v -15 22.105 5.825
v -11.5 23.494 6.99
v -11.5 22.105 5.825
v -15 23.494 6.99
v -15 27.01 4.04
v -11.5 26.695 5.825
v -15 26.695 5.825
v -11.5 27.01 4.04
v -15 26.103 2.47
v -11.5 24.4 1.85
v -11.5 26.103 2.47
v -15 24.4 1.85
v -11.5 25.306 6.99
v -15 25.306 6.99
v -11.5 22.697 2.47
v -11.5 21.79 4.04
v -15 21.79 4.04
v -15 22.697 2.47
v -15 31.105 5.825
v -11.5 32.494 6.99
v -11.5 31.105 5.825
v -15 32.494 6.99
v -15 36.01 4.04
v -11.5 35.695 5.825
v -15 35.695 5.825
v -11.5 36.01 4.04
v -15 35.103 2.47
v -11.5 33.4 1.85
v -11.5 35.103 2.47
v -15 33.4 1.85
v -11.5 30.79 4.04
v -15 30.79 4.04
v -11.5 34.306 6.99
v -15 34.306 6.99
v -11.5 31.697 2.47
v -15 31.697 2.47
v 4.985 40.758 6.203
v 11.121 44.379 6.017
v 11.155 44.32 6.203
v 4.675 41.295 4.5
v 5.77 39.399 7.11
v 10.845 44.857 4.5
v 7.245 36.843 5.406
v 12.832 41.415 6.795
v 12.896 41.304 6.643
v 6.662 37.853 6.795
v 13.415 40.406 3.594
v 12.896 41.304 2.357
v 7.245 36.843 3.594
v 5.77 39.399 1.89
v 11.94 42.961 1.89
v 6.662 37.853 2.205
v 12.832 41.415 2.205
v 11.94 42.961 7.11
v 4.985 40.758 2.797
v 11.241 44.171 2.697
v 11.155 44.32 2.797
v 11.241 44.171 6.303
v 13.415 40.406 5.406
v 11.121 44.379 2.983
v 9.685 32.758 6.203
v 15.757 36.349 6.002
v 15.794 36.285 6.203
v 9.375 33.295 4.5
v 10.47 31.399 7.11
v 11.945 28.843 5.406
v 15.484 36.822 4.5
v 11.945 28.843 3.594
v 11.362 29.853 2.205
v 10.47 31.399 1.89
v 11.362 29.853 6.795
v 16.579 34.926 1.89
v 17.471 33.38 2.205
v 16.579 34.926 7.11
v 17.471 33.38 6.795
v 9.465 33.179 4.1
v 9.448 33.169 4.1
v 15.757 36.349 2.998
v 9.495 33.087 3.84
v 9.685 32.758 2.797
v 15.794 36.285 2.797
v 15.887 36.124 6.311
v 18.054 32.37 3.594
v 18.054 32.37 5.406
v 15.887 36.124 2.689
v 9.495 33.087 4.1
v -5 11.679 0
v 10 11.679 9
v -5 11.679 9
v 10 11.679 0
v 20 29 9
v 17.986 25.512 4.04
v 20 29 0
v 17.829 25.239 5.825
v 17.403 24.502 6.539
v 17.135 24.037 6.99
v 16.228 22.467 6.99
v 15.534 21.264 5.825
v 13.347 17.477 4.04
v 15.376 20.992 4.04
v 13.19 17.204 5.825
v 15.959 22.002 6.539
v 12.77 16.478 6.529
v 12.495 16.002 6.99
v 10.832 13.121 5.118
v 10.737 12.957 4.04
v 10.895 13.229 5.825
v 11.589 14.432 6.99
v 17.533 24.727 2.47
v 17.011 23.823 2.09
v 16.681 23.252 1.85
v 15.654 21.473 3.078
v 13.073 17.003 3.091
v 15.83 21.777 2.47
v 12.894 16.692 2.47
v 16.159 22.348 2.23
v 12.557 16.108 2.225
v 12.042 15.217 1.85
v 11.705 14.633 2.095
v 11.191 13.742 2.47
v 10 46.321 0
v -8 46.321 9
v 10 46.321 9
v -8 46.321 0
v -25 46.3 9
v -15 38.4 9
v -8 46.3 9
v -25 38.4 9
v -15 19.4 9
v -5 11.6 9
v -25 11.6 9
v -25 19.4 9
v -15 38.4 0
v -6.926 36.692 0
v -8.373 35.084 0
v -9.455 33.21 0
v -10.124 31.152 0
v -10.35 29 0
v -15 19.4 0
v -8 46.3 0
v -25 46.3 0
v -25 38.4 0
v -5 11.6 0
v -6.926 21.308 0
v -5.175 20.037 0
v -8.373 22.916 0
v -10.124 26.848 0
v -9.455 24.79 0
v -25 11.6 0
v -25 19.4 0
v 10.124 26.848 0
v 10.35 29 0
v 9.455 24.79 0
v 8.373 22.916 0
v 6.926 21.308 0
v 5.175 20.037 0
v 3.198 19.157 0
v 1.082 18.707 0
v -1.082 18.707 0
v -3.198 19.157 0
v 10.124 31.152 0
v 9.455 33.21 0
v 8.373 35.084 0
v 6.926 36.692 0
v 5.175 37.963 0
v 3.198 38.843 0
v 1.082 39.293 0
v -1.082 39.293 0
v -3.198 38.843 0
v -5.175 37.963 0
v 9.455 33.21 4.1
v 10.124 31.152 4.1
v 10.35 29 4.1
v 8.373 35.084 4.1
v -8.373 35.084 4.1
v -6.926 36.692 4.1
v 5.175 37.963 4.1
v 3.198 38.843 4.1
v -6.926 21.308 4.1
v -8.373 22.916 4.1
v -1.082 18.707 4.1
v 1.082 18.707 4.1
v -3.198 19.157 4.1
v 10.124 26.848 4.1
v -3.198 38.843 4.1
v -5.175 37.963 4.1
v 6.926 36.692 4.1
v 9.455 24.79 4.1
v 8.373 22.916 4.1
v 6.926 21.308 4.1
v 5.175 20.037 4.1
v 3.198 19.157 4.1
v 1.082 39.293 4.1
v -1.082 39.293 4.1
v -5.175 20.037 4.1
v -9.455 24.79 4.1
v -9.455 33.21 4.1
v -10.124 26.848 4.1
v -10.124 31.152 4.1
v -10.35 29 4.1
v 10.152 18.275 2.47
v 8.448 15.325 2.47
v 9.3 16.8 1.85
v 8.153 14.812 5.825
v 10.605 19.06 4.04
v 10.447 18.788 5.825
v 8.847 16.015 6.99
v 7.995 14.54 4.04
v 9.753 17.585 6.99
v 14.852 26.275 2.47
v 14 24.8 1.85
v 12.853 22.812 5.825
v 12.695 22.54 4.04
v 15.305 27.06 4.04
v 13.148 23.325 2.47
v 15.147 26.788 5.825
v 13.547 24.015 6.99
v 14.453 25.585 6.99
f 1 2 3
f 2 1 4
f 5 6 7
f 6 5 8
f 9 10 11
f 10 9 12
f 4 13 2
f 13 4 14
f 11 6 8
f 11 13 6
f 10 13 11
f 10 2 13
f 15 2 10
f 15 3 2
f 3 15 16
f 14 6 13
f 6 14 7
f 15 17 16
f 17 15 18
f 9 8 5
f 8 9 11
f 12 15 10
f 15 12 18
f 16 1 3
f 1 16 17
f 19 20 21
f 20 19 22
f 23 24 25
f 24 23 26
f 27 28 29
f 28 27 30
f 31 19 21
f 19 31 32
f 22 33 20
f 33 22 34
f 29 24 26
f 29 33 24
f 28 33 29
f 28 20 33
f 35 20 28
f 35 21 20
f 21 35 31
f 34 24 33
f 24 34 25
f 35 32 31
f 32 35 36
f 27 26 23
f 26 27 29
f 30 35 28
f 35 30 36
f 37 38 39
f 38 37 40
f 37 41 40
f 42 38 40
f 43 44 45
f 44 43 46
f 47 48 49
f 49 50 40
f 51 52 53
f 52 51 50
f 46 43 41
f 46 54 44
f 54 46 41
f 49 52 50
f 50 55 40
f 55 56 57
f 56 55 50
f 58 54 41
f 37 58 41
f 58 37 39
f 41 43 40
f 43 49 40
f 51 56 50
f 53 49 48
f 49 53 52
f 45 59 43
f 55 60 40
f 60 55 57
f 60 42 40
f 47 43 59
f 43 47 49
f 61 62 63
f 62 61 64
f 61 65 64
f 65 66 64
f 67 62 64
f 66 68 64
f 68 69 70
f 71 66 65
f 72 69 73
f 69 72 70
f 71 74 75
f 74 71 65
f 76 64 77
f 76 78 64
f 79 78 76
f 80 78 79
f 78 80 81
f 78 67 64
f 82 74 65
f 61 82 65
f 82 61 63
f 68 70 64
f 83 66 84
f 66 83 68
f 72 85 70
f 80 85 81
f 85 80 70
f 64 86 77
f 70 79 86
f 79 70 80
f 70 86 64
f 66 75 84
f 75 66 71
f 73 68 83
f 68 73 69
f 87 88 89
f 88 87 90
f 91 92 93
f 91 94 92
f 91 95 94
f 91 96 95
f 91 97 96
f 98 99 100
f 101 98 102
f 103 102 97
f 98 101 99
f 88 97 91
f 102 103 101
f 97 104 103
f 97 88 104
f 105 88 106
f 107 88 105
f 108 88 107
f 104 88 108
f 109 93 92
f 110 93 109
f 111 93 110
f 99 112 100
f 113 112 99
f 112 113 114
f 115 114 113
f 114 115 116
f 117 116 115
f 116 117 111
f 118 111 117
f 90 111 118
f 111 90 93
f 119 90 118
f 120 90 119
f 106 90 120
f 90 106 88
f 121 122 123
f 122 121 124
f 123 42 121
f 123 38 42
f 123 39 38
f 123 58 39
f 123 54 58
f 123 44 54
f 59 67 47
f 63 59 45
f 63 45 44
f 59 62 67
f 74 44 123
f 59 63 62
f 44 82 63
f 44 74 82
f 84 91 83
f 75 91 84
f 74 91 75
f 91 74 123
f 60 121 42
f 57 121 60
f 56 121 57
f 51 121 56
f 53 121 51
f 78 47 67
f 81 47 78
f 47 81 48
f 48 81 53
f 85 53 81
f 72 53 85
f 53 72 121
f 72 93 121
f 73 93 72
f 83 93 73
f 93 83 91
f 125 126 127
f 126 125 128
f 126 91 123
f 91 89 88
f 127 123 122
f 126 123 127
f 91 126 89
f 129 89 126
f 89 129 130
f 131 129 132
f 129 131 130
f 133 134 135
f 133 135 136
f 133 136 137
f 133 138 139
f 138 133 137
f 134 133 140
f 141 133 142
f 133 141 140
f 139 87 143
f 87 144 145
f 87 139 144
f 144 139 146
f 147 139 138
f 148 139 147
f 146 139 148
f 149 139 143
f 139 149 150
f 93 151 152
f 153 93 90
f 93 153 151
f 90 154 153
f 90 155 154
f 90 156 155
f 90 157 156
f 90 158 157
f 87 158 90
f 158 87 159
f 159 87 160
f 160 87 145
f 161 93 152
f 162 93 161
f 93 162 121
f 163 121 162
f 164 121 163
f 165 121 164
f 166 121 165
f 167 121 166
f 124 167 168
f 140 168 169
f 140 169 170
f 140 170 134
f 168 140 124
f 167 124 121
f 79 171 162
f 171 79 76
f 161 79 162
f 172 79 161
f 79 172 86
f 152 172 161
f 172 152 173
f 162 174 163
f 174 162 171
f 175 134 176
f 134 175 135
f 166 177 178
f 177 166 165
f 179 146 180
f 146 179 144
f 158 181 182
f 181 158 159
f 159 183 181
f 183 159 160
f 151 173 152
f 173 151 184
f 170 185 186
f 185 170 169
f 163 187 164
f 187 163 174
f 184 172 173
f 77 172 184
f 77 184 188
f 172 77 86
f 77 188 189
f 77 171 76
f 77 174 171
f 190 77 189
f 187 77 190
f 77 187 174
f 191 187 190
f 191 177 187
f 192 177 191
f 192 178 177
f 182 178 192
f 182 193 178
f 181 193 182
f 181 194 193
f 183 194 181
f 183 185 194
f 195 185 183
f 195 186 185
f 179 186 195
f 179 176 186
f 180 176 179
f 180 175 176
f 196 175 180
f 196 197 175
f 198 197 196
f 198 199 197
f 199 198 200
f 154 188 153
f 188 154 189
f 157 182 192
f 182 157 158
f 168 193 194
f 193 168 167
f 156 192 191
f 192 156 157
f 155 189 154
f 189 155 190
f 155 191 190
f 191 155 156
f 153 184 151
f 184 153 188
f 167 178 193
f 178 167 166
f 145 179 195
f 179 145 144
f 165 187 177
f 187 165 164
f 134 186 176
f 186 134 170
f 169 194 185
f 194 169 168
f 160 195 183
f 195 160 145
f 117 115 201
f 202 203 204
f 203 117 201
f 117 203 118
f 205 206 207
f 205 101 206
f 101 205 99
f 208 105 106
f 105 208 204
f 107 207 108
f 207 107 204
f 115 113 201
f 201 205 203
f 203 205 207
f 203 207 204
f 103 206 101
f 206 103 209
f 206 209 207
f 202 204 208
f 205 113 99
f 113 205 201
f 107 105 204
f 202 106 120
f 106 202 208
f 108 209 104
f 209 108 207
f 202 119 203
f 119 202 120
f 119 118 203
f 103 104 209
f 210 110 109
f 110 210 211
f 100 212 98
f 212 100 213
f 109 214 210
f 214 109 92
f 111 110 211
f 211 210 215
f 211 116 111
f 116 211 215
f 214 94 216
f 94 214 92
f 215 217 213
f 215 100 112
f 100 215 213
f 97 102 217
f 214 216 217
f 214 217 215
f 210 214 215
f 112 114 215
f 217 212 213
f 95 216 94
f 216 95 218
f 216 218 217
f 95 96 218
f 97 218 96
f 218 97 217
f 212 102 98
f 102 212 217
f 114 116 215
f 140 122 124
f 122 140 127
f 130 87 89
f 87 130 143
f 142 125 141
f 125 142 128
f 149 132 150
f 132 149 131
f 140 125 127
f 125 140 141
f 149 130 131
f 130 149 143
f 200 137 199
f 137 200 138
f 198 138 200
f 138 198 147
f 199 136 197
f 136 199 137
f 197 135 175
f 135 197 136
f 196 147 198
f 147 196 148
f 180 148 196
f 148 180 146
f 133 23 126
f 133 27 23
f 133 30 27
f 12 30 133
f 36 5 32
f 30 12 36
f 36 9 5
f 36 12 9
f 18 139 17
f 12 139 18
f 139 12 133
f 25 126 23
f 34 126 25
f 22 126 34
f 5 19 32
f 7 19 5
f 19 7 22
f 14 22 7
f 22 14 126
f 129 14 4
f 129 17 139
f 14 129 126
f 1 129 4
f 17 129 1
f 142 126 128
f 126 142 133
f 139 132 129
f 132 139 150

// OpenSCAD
z=9; //высота
g=3.5; //глубина дырок 
//дексибироза
translate ([0,79,0]) {
difference () {
translate([0,-50,0])cylinder(z,20,20, $fn=6);
translate ([0,-50,-0.1])cylinder(4.2,10.35,10.35);
translate ([-7,0,1]) {
rotate([0, 90, 0]) translate([-3.5,-54.6,-17+g]) cylinder(9,2.65,2.65);        
rotate([0, 90, 0]) translate([-3.5,-45.6,-17+g]) cylinder(9,2.65,2.65);          
}  
translate ([9.3,-62.2,4.5])rotate([0,90,-30])cylinder (4.5+g,2.65,2.65);
translate ([14,-54.2,4.5])rotate([0,90,-30])cylinder (4.5+g,2.65,2.65);
translate ([-28,-73,-1])cube ([20,45,11]);

translate ([2,-80,1]) {
translate ([4,40,g])rotate ([90,0,120])cylinder(4.5+g,2.65,2.65);   
translate ([4+4.7,37.5+-9+g,g])rotate ([90,0,120])cylinder(4.5+3.5,2.65,2.65); 
  }  
 }
difference () {
translate ([-25,-67.4,0])cube ([20,34.7,z]);
translate ([0,-50,-0.1])cylinder(4.2,10.35,10.35);
translate ([-7,0,1]) {
rotate([0, 90, 0]) translate([-3.5,-54.6,-17+g]) cylinder(9,2.65,2.65);        
rotate([0, 90, 0]) translate([-3.5,-45.6,-17+g]) cylinder(9,2.65,2.65);          
}  

translate ([-35,-59.6,-1])cube ([20,19,12]);
 }
}
